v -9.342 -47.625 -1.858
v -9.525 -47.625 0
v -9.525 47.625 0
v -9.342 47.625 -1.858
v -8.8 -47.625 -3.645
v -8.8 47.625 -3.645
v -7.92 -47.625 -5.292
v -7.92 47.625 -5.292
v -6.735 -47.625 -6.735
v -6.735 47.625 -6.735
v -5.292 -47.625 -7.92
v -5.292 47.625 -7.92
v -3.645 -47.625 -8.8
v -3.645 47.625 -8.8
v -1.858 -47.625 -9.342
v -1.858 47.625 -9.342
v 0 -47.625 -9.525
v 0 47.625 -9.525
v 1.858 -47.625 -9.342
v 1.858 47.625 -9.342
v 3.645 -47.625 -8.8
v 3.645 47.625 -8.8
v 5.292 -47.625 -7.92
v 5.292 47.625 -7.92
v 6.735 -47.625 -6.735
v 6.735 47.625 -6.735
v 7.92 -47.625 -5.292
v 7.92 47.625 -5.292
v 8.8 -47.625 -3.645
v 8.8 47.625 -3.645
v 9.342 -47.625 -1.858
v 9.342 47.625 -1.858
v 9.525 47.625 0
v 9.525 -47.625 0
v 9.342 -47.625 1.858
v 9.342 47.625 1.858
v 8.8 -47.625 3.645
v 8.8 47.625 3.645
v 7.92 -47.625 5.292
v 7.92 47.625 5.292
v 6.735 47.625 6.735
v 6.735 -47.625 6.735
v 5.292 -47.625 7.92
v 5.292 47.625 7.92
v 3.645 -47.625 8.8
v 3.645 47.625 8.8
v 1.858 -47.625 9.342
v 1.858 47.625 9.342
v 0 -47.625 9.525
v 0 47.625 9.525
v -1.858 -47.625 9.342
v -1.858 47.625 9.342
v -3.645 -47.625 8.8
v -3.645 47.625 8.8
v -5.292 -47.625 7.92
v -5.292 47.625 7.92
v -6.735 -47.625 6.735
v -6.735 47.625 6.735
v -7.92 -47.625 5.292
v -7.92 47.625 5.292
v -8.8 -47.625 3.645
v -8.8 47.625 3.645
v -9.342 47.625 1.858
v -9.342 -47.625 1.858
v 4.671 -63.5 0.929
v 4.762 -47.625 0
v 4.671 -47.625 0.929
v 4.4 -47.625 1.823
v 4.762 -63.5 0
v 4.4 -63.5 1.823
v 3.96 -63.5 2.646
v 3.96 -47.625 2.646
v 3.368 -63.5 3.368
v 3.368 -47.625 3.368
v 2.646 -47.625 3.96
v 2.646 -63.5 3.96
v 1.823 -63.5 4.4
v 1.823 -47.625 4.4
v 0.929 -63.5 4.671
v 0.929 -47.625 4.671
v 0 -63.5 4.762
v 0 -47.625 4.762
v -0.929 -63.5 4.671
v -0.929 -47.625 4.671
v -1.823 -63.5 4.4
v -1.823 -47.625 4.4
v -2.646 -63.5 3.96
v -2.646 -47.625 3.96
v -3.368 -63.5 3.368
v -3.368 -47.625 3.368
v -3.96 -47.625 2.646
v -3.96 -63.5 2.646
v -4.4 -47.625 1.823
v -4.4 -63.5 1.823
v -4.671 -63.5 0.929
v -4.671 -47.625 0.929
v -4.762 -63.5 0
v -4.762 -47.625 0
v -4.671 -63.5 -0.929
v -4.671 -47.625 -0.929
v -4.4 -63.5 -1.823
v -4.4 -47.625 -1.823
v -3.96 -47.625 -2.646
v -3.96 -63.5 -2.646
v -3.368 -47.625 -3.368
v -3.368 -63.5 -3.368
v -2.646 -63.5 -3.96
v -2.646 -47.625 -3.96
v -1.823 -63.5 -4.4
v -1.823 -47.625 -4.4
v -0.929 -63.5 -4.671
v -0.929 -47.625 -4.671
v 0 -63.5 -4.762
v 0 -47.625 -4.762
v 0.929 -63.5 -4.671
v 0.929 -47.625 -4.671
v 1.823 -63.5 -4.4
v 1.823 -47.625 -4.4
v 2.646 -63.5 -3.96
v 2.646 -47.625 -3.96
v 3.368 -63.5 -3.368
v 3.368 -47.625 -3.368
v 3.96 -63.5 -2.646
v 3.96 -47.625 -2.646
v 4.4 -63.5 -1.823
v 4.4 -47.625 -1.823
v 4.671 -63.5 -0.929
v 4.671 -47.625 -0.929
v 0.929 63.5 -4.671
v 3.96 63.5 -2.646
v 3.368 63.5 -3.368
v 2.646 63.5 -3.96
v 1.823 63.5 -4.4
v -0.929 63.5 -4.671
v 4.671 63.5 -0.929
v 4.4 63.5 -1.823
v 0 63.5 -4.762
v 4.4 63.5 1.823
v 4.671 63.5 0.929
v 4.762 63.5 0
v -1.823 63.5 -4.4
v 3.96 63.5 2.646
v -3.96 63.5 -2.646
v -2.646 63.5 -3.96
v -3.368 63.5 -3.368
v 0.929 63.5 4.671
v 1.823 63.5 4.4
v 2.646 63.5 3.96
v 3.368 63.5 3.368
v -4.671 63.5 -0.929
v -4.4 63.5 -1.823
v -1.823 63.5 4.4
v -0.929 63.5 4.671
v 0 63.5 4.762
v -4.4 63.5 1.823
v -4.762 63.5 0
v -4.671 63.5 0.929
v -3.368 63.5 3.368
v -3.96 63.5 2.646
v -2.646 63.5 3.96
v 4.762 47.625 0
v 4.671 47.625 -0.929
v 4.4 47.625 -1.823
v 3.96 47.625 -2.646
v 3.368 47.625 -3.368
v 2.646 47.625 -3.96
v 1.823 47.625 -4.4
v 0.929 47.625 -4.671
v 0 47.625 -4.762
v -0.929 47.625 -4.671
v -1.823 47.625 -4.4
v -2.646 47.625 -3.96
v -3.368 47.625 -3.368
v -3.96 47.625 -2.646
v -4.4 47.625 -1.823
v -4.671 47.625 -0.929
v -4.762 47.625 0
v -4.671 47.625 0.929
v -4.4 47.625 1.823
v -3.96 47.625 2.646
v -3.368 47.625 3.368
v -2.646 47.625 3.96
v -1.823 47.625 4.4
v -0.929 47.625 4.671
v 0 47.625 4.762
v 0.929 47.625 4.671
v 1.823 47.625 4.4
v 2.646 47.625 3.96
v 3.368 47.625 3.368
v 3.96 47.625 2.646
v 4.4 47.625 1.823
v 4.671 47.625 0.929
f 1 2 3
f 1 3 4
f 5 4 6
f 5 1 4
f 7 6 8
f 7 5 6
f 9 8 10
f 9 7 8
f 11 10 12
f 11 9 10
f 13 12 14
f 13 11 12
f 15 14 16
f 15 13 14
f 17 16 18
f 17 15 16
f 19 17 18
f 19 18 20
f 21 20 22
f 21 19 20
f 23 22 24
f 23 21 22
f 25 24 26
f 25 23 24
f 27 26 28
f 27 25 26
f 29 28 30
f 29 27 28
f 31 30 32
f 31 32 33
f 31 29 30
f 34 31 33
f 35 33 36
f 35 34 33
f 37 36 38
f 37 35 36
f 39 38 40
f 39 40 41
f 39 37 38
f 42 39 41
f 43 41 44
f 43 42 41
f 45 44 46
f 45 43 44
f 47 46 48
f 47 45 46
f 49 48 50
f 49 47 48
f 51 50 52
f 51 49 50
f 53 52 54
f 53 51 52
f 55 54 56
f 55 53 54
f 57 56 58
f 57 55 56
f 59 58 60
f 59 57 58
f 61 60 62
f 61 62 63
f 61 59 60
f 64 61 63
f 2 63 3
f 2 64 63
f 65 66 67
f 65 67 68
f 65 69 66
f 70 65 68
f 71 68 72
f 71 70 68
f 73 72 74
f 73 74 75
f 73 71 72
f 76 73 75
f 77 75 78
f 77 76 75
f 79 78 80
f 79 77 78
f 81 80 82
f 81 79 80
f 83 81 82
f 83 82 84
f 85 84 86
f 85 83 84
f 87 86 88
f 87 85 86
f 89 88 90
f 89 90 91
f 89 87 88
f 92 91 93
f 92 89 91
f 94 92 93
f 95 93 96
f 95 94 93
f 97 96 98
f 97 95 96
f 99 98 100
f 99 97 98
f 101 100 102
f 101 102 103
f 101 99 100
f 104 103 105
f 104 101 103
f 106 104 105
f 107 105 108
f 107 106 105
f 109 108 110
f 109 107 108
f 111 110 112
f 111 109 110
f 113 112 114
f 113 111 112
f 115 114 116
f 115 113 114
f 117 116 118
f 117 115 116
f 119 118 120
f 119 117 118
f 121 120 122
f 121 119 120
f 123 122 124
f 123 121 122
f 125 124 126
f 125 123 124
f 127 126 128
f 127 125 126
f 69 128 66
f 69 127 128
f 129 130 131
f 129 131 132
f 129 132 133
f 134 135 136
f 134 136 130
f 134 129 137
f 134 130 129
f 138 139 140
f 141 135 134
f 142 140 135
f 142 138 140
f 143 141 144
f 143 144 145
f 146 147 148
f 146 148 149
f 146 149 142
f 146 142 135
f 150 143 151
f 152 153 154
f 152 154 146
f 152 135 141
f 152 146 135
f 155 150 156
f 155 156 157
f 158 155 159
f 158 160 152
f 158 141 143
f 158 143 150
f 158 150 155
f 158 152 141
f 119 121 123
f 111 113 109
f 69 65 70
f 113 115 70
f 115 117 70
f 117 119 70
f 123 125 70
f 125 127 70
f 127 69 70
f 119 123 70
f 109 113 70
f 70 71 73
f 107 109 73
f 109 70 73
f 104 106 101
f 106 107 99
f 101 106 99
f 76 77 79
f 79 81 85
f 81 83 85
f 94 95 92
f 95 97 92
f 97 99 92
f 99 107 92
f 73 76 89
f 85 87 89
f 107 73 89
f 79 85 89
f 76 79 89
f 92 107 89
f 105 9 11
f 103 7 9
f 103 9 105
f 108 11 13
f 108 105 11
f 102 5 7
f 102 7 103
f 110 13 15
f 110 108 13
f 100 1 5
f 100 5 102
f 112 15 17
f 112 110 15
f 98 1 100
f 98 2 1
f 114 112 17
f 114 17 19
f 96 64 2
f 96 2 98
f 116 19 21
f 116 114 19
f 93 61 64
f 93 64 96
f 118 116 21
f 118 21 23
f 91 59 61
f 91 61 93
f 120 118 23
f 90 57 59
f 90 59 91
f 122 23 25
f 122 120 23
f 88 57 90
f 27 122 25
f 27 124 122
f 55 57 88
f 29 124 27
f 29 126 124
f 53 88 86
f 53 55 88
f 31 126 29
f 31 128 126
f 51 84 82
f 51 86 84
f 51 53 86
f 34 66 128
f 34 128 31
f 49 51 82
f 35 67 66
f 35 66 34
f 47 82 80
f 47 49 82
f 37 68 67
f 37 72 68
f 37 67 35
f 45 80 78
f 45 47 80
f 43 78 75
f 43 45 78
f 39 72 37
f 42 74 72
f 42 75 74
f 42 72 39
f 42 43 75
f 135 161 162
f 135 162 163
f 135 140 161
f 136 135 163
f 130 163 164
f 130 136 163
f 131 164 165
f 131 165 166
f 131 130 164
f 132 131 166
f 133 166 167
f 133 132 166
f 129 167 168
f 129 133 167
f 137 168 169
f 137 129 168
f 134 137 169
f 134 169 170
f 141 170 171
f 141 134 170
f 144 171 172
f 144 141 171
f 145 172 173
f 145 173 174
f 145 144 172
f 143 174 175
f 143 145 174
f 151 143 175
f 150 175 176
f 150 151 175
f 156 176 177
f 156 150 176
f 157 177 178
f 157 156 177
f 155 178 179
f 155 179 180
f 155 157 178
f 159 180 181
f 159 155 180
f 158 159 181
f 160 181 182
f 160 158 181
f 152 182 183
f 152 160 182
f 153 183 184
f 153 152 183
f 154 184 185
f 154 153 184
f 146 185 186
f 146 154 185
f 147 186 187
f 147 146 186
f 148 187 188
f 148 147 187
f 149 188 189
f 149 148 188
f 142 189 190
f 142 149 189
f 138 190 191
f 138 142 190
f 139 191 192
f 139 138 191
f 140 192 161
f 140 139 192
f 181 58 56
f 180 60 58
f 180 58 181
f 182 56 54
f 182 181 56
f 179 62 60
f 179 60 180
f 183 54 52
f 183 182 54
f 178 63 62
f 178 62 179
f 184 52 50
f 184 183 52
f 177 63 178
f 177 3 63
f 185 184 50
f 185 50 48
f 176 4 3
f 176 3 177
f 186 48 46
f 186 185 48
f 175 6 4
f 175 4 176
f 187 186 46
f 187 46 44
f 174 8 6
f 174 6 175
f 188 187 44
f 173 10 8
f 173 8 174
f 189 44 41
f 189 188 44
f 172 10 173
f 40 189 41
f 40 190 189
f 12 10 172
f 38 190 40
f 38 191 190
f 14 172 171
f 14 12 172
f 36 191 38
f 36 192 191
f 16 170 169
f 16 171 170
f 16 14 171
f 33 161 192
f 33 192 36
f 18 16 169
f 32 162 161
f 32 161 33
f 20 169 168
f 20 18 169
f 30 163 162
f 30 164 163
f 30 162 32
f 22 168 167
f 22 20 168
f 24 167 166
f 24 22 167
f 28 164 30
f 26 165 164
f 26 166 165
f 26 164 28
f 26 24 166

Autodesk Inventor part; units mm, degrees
ref_plane "YZ Plane" through (0, 0, 0) normal (1, 0, 0) x (0, 1, 0)
ref_plane "XZ Plane" through (0, 0, 0) normal (0, 1, 0) x (-1, 0, 0)
ref_plane "XY Plane" through (0, 0, 0) normal (0, 0, 1) x (1, 0, 0)
sketch "Sketch1" plane through (0, 0, 0) normal (0, 1, 0) x (-1, 0, 0)
  circle A0 centre (0, 0) radius 9.525
  dimension "d0" = 19.05
extrude "Extrusion1" add sketch "Sketch1" along normal mid plane 127
sketch "Sketch2" plane through (0, 63.5, 0) normal (0, 1, 0) x (1, 0, 0)
  circle A0 centre (0, 0) radius 9.525
  circle A1 centre (0, 0) radius 4.7625
  dimension "d3" = 9.525
  dimension "d4" = 19.05
extrude "Extrusion2" cut sketch "Sketch2" against normal blind 15.875
sketch "Sketch3" plane through (0, -63.5, 0) normal (0, -1, 0) x (1, 0, 0)
  circle A0 centre (0, 0) radius 4.7625
  circle A1 centre (0, 0) radius 9.525
  dimension "d7" = 9.525
extrude "Extrusion3" cut sketch "Sketch3" against normal blind 15.875
properties part number "drum" material "Aluminum 6061"
